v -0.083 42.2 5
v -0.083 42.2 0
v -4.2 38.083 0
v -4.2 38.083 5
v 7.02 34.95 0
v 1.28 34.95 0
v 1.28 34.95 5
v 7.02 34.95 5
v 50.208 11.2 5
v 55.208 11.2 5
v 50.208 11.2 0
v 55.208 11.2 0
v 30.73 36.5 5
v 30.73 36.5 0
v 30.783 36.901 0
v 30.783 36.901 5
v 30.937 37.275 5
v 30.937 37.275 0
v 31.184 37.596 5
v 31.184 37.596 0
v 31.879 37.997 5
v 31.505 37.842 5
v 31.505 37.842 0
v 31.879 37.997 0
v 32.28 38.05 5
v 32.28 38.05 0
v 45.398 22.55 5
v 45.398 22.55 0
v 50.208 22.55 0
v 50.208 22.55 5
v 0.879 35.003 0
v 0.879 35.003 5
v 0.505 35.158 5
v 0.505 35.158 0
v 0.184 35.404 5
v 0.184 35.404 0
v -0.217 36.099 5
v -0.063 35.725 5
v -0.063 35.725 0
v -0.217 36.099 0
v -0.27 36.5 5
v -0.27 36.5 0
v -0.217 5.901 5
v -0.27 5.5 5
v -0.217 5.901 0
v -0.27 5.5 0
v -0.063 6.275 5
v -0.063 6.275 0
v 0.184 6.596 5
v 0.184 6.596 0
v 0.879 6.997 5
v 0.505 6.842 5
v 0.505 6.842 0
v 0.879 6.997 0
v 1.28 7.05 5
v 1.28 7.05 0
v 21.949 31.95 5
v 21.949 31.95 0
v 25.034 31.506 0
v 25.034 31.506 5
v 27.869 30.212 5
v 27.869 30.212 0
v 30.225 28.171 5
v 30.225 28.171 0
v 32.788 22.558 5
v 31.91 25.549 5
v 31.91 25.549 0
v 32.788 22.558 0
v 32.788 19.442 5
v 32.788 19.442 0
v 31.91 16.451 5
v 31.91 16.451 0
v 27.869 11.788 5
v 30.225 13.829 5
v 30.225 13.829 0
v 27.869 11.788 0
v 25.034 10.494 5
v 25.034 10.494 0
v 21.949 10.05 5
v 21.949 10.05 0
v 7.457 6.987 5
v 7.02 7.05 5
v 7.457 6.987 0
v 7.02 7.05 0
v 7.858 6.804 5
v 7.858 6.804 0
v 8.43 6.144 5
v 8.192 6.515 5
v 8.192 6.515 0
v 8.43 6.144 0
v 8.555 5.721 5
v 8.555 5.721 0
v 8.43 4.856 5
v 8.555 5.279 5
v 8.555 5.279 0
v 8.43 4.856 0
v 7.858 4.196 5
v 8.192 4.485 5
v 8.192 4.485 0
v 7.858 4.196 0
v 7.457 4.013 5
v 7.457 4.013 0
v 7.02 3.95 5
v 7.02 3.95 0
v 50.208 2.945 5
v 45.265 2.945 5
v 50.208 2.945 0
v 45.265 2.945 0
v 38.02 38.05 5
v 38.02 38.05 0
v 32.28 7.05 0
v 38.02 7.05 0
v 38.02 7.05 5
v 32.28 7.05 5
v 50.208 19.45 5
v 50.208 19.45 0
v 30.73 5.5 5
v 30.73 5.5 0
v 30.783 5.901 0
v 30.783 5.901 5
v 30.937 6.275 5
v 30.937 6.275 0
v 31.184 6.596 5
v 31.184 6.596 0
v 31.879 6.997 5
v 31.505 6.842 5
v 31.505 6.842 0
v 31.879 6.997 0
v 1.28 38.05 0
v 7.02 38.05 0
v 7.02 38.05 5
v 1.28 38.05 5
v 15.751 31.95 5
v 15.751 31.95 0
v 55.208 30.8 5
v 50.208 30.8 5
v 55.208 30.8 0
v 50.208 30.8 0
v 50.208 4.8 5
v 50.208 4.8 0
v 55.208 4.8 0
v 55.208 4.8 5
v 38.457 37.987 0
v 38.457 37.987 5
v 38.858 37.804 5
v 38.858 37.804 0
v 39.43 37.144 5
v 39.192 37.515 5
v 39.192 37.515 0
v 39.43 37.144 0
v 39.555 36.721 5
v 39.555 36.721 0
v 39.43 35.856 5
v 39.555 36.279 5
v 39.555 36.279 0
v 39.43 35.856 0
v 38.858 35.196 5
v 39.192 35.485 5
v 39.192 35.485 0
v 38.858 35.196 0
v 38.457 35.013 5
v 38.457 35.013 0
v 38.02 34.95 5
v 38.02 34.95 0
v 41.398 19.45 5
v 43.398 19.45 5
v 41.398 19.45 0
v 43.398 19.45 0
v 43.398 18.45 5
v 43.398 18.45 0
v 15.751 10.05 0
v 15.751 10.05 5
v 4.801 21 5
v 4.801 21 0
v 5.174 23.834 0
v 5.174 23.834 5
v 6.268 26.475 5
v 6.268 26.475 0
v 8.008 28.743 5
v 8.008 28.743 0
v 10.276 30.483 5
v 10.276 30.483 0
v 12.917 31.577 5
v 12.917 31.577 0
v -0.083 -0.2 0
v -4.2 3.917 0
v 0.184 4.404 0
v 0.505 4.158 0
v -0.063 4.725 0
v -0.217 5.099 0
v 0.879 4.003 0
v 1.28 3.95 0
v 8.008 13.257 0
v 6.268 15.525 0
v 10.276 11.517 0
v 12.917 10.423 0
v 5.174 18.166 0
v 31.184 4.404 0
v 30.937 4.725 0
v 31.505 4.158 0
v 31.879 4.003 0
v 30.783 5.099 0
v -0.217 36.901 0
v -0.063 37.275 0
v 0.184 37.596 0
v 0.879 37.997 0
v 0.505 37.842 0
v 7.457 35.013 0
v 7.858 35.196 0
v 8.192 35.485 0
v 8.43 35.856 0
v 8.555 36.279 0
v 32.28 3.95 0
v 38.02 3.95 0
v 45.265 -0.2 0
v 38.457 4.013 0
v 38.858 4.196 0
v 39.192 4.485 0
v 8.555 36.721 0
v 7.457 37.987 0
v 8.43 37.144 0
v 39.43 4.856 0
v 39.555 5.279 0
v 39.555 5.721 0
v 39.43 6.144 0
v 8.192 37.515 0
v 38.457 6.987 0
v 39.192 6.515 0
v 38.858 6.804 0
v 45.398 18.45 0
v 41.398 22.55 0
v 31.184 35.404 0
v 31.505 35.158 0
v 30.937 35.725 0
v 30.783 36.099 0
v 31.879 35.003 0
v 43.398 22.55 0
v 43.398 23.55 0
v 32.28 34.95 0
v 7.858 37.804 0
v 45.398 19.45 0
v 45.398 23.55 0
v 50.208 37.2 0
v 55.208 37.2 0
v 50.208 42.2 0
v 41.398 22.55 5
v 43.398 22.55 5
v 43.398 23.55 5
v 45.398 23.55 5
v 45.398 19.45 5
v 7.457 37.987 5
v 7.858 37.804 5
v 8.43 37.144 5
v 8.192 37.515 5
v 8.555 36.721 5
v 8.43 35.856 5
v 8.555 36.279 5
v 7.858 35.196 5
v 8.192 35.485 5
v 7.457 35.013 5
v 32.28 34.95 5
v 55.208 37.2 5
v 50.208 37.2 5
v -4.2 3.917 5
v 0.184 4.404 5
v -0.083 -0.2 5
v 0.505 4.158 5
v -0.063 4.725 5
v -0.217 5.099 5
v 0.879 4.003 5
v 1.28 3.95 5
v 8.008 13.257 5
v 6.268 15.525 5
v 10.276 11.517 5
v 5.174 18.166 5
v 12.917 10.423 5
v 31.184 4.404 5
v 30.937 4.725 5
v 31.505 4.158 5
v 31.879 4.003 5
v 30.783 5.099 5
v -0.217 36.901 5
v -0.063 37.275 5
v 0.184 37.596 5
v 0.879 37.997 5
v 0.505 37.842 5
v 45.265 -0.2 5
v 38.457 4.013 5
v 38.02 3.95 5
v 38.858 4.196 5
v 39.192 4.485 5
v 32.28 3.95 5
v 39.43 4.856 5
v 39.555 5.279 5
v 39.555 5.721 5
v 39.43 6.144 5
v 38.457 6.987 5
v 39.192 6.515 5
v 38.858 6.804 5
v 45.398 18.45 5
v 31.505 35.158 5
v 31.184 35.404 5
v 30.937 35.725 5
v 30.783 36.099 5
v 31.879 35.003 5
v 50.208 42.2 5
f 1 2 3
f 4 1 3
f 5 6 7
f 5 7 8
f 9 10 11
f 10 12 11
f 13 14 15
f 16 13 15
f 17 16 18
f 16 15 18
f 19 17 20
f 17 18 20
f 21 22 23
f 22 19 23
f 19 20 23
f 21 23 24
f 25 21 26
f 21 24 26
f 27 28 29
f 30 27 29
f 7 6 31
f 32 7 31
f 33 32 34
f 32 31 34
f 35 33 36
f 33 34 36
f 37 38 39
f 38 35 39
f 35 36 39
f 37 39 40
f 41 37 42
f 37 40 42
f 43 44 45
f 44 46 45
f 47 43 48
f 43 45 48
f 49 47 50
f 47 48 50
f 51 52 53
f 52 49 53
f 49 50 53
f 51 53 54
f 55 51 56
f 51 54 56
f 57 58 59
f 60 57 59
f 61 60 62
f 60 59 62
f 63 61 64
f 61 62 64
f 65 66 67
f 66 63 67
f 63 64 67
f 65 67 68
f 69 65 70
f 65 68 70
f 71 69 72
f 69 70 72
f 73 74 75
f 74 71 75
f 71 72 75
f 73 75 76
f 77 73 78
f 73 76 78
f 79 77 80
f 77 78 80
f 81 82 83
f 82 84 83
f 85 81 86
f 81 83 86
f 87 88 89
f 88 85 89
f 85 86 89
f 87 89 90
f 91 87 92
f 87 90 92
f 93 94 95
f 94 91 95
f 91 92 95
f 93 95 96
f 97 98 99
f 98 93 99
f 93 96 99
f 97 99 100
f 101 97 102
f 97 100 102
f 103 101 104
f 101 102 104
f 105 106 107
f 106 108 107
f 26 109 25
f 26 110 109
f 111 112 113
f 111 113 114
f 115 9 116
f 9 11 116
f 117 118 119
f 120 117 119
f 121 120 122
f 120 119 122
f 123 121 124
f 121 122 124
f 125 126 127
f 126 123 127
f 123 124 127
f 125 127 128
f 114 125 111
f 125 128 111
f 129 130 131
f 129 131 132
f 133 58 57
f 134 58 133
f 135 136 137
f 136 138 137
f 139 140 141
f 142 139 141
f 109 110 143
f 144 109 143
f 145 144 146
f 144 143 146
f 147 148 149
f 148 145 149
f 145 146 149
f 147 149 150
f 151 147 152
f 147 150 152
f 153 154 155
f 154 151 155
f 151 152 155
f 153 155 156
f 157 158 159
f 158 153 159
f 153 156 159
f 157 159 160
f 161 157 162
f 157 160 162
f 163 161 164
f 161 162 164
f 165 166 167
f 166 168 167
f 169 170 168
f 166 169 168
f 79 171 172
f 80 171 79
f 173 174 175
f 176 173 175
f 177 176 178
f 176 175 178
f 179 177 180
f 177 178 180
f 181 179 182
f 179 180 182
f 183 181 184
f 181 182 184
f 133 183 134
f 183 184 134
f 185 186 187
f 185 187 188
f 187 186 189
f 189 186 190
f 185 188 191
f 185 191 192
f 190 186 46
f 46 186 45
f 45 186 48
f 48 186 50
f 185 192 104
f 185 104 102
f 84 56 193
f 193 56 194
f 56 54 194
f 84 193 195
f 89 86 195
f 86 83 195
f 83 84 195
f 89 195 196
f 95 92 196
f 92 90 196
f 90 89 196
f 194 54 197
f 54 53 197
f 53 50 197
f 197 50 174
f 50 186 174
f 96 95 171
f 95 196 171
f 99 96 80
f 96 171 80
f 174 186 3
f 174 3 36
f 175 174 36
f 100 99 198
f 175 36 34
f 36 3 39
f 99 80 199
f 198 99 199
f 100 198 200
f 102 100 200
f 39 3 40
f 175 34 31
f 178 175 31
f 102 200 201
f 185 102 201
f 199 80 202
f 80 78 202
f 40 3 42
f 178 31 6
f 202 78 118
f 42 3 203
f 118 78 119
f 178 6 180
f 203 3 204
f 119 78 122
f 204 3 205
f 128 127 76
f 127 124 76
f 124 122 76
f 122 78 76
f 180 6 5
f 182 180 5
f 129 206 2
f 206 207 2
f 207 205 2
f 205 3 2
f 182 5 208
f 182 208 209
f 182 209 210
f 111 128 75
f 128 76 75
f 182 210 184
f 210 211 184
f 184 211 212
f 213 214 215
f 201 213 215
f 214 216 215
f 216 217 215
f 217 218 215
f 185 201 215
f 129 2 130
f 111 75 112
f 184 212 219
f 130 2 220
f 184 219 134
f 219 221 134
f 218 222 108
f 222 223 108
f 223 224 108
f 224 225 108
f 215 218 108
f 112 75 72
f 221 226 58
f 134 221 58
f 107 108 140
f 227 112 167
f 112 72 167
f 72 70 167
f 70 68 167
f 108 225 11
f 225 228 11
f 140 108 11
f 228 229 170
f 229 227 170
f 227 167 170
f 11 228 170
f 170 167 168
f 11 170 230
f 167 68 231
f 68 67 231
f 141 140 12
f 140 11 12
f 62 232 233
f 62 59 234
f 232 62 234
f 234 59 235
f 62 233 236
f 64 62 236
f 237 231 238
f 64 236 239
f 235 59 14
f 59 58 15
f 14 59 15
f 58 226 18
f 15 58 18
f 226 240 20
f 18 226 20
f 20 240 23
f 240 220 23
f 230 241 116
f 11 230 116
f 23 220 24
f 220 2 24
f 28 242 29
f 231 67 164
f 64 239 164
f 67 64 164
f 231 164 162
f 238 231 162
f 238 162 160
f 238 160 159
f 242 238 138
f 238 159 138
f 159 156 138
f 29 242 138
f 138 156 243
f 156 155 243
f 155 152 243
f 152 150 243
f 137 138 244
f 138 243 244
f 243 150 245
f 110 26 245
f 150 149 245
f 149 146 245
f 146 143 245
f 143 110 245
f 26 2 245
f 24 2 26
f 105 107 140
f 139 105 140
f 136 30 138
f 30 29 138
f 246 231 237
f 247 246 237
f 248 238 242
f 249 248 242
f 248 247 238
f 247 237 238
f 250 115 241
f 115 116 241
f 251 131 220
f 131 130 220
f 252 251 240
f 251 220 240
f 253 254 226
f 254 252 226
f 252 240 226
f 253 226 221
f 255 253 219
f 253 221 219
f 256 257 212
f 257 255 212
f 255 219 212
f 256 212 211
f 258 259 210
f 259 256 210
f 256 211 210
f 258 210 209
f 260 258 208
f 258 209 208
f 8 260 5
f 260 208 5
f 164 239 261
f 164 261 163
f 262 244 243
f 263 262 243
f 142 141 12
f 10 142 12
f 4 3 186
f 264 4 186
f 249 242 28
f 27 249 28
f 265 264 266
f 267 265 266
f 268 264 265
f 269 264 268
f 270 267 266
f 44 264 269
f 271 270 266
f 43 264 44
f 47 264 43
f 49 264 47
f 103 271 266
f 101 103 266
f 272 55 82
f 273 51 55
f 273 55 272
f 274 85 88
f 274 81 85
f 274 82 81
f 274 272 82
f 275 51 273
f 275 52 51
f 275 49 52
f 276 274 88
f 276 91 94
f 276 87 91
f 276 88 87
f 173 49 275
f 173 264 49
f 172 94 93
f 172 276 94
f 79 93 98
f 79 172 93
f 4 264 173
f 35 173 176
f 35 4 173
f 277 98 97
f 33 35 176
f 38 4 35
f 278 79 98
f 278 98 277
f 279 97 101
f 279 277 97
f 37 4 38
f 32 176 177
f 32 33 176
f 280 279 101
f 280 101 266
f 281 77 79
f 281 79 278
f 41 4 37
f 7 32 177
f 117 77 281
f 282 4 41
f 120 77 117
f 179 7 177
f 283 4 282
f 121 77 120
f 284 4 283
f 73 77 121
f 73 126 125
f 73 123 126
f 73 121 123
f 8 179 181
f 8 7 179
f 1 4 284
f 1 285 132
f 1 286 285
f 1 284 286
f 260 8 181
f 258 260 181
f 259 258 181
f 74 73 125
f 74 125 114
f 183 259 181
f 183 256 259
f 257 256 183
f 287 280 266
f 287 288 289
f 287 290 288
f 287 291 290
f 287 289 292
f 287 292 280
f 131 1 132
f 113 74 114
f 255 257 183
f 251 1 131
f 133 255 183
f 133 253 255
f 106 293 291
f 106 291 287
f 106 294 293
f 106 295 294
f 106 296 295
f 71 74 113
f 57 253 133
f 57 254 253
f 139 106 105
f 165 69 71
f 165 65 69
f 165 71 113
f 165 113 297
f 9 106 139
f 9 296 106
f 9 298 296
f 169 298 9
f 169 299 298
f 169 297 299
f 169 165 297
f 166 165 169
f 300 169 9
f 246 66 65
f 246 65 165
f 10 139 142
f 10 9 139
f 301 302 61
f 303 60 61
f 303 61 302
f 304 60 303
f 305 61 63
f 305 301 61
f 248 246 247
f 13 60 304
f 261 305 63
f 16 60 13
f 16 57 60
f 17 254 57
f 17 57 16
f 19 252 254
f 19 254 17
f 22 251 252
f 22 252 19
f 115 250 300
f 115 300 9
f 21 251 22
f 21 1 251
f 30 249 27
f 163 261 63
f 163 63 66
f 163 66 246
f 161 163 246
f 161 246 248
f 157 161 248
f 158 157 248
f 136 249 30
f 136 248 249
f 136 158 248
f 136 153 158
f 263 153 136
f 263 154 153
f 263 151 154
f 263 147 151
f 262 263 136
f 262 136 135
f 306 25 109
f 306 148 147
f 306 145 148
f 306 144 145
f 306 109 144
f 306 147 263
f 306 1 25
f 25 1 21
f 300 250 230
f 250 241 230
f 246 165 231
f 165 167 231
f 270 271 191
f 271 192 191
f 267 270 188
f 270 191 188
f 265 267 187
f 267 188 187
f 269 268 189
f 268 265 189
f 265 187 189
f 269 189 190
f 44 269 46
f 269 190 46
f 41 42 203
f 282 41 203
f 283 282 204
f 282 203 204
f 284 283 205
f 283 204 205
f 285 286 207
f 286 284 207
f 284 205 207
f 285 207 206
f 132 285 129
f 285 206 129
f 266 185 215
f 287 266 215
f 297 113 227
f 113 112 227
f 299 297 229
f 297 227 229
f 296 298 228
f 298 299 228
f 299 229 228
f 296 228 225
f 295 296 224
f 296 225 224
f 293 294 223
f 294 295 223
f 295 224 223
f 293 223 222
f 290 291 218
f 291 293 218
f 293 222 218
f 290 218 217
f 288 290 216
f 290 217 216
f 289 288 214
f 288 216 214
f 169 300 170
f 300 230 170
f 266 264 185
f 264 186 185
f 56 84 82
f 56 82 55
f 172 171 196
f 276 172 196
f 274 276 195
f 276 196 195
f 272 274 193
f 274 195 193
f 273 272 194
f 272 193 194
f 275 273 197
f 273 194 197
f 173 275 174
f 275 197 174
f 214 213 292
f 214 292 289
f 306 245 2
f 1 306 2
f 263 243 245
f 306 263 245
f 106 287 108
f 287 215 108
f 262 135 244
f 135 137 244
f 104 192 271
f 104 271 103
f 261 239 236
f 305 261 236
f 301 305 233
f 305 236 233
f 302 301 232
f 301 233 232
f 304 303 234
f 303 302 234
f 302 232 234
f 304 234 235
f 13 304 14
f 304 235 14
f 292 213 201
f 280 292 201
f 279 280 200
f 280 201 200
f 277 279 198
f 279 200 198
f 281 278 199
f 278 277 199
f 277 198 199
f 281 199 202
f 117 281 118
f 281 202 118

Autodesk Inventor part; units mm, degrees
ref_plane "YZ Plane" through (0, 0, 0) normal (1, 0, 0) x (0, 1, 0)
ref_plane "XZ Plane" through (0, 0, 0) normal (0, 1, 0) x (-1, 0, 0)
ref_plane "XY Plane" through (0, 0, 0) normal (0, 0, 1) x (1, 0, 0)
sketch "Boceto1" plane through (0, 0, 0) normal (0, 0, 1) x (1, 0, 0)
  line L0 (1.2797, 34.95) -> (7.0205, 34.95)
  arc A0 (7.0205, 34.95) -> (7.0205, 38.05) centre (7.0205, 36.5) ccw
  line L1 (7.0205, 38.05) -> (1.2797, 38.05)
  arc A1 (1.2797, 38.05) -> (-0.2703, 36.5) centre (1.2797, 36.5) ccw
  arc A2 (-0.2703, 36.5) -> (1.2797, 34.95) centre (1.2797, 36.5) ccw
  line L2 (7.0205, 7.05) -> (1.2797, 7.05)
  arc A3 (1.2797, 7.05) -> (-0.2703, 5.5) centre (1.2797, 5.5) ccw
  arc A4 (-0.2703, 5.5) -> (1.2797, 3.95) centre (1.2797, 5.5) ccw
  line L3 (1.2797, 3.95) -> (7.0205, 3.95)
  arc A5 (7.0205, 3.95) -> (7.0205, 7.05) centre (7.0205, 5.5) ccw
  arc A6 (38.0205, 34.95) -> (38.0205, 38.05) centre (38.0205, 36.5) ccw
  line L4 (38.0205, 38.05) -> (32.2797, 38.05)
  arc A7 (32.2797, 38.05) -> (30.7297, 36.5) centre (32.2797, 36.5) ccw
  arc A8 (30.7297, 36.5) -> (32.2797, 34.95) centre (32.2797, 36.5) ccw
  line L5 (32.2797, 34.95) -> (38.0205, 34.95)
  arc A9 (15.751, 31.95) -> (4.801, 21) centre (15.751, 21) ccw
  arc A10 (4.801, 21) -> (15.751, 10.05) centre (15.751, 21) ccw
  line L6 (15.751, 10.05) -> (21.9491, 10.05)
  arc A11 (21.9491, 10.05) -> (21.9491, 31.95) centre (21.9491, 21) ccw
  line L7 (21.9491, 31.95) -> (15.751, 31.95)
  line L8 (38.0205, 7.05) -> (32.2797, 7.05)
  arc A12 (32.2797, 7.05) -> (30.7297, 5.5) centre (32.2797, 5.5) ccw
  arc A13 (30.7297, 5.5) -> (32.2797, 3.95) centre (32.2797, 5.5) ccw
  line L9 (32.2797, 3.95) -> (38.0205, 3.95)
  arc A14 (38.0205, 3.95) -> (38.0205, 7.05) centre (38.0205, 5.5) ccw
  line L10 (45.2649, -0.2) -> (45.2649, 2.9451)
  line L11 (45.2649, 2.9451) -> (50.2083, 2.9451)
  line L12 (50.2083, 2.9451) -> (50.2083, 4.8)
  line L13 (50.2083, 4.8) -> (55.2083, 4.8)
  line L14 (55.2083, 4.8) -> (55.2083, 11.2)
  line L15 (55.2083, 11.2) -> (50.2083, 11.2)
  line L16 (50.2083, 11.2) -> (50.2083, 19.45)
  line L17 (50.2083, 19.45) -> (45.3976, 19.45)
  line L18 (45.3976, 19.45) -> (45.3976, 18.45)
  line L19 (45.3976, 18.45) -> (43.3976, 18.45)
  line L20 (43.3976, 18.45) -> (43.3976, 19.45)
  line L21 (43.3976, 19.45) -> (41.3976, 19.45)
  line L22 (41.3976, 19.45) -> (41.3976, 22.55)
  line L23 (41.3976, 22.55) -> (43.3976, 22.55)
  line L24 (43.3976, 22.55) -> (43.3976, 23.55)
  line L25 (43.3976, 23.55) -> (45.3976, 23.55)
  line L26 (45.3976, 23.55) -> (45.3976, 22.55)
  line L27 (45.3976, 22.55) -> (50.2083, 22.55)
  line L28 (50.2083, 22.55) -> (50.2083, 30.8)
  line L29 (50.2083, 30.8) -> (55.2083, 30.8)
  line L30 (55.2083, 30.8) -> (55.2083, 37.2)
  line L31 (55.2083, 37.2) -> (50.2083, 37.2)
  line L32 (50.2083, 37.2) -> (50.2083, 42.2)
  line L33 (50.2083, 42.2) -> (-0.0828, 42.2)
  line L34 (-0.0828, 42.2) -> (-4.2, 38.0828)
  line L35 (-4.2, 38.0828) -> (-4.2, 3.9172)
  line L36 (-4.2, 3.9172) -> (-0.0828, -0.2)
  line L37 (-0.0828, -0.2) -> (45.2649, -0.2)
  point P0 (0, 0)
extrude "Extrusión1" add sketch "Boceto1" along normal blind 5
properties part number "carro x lado motor pieza 5 soporte nema"
